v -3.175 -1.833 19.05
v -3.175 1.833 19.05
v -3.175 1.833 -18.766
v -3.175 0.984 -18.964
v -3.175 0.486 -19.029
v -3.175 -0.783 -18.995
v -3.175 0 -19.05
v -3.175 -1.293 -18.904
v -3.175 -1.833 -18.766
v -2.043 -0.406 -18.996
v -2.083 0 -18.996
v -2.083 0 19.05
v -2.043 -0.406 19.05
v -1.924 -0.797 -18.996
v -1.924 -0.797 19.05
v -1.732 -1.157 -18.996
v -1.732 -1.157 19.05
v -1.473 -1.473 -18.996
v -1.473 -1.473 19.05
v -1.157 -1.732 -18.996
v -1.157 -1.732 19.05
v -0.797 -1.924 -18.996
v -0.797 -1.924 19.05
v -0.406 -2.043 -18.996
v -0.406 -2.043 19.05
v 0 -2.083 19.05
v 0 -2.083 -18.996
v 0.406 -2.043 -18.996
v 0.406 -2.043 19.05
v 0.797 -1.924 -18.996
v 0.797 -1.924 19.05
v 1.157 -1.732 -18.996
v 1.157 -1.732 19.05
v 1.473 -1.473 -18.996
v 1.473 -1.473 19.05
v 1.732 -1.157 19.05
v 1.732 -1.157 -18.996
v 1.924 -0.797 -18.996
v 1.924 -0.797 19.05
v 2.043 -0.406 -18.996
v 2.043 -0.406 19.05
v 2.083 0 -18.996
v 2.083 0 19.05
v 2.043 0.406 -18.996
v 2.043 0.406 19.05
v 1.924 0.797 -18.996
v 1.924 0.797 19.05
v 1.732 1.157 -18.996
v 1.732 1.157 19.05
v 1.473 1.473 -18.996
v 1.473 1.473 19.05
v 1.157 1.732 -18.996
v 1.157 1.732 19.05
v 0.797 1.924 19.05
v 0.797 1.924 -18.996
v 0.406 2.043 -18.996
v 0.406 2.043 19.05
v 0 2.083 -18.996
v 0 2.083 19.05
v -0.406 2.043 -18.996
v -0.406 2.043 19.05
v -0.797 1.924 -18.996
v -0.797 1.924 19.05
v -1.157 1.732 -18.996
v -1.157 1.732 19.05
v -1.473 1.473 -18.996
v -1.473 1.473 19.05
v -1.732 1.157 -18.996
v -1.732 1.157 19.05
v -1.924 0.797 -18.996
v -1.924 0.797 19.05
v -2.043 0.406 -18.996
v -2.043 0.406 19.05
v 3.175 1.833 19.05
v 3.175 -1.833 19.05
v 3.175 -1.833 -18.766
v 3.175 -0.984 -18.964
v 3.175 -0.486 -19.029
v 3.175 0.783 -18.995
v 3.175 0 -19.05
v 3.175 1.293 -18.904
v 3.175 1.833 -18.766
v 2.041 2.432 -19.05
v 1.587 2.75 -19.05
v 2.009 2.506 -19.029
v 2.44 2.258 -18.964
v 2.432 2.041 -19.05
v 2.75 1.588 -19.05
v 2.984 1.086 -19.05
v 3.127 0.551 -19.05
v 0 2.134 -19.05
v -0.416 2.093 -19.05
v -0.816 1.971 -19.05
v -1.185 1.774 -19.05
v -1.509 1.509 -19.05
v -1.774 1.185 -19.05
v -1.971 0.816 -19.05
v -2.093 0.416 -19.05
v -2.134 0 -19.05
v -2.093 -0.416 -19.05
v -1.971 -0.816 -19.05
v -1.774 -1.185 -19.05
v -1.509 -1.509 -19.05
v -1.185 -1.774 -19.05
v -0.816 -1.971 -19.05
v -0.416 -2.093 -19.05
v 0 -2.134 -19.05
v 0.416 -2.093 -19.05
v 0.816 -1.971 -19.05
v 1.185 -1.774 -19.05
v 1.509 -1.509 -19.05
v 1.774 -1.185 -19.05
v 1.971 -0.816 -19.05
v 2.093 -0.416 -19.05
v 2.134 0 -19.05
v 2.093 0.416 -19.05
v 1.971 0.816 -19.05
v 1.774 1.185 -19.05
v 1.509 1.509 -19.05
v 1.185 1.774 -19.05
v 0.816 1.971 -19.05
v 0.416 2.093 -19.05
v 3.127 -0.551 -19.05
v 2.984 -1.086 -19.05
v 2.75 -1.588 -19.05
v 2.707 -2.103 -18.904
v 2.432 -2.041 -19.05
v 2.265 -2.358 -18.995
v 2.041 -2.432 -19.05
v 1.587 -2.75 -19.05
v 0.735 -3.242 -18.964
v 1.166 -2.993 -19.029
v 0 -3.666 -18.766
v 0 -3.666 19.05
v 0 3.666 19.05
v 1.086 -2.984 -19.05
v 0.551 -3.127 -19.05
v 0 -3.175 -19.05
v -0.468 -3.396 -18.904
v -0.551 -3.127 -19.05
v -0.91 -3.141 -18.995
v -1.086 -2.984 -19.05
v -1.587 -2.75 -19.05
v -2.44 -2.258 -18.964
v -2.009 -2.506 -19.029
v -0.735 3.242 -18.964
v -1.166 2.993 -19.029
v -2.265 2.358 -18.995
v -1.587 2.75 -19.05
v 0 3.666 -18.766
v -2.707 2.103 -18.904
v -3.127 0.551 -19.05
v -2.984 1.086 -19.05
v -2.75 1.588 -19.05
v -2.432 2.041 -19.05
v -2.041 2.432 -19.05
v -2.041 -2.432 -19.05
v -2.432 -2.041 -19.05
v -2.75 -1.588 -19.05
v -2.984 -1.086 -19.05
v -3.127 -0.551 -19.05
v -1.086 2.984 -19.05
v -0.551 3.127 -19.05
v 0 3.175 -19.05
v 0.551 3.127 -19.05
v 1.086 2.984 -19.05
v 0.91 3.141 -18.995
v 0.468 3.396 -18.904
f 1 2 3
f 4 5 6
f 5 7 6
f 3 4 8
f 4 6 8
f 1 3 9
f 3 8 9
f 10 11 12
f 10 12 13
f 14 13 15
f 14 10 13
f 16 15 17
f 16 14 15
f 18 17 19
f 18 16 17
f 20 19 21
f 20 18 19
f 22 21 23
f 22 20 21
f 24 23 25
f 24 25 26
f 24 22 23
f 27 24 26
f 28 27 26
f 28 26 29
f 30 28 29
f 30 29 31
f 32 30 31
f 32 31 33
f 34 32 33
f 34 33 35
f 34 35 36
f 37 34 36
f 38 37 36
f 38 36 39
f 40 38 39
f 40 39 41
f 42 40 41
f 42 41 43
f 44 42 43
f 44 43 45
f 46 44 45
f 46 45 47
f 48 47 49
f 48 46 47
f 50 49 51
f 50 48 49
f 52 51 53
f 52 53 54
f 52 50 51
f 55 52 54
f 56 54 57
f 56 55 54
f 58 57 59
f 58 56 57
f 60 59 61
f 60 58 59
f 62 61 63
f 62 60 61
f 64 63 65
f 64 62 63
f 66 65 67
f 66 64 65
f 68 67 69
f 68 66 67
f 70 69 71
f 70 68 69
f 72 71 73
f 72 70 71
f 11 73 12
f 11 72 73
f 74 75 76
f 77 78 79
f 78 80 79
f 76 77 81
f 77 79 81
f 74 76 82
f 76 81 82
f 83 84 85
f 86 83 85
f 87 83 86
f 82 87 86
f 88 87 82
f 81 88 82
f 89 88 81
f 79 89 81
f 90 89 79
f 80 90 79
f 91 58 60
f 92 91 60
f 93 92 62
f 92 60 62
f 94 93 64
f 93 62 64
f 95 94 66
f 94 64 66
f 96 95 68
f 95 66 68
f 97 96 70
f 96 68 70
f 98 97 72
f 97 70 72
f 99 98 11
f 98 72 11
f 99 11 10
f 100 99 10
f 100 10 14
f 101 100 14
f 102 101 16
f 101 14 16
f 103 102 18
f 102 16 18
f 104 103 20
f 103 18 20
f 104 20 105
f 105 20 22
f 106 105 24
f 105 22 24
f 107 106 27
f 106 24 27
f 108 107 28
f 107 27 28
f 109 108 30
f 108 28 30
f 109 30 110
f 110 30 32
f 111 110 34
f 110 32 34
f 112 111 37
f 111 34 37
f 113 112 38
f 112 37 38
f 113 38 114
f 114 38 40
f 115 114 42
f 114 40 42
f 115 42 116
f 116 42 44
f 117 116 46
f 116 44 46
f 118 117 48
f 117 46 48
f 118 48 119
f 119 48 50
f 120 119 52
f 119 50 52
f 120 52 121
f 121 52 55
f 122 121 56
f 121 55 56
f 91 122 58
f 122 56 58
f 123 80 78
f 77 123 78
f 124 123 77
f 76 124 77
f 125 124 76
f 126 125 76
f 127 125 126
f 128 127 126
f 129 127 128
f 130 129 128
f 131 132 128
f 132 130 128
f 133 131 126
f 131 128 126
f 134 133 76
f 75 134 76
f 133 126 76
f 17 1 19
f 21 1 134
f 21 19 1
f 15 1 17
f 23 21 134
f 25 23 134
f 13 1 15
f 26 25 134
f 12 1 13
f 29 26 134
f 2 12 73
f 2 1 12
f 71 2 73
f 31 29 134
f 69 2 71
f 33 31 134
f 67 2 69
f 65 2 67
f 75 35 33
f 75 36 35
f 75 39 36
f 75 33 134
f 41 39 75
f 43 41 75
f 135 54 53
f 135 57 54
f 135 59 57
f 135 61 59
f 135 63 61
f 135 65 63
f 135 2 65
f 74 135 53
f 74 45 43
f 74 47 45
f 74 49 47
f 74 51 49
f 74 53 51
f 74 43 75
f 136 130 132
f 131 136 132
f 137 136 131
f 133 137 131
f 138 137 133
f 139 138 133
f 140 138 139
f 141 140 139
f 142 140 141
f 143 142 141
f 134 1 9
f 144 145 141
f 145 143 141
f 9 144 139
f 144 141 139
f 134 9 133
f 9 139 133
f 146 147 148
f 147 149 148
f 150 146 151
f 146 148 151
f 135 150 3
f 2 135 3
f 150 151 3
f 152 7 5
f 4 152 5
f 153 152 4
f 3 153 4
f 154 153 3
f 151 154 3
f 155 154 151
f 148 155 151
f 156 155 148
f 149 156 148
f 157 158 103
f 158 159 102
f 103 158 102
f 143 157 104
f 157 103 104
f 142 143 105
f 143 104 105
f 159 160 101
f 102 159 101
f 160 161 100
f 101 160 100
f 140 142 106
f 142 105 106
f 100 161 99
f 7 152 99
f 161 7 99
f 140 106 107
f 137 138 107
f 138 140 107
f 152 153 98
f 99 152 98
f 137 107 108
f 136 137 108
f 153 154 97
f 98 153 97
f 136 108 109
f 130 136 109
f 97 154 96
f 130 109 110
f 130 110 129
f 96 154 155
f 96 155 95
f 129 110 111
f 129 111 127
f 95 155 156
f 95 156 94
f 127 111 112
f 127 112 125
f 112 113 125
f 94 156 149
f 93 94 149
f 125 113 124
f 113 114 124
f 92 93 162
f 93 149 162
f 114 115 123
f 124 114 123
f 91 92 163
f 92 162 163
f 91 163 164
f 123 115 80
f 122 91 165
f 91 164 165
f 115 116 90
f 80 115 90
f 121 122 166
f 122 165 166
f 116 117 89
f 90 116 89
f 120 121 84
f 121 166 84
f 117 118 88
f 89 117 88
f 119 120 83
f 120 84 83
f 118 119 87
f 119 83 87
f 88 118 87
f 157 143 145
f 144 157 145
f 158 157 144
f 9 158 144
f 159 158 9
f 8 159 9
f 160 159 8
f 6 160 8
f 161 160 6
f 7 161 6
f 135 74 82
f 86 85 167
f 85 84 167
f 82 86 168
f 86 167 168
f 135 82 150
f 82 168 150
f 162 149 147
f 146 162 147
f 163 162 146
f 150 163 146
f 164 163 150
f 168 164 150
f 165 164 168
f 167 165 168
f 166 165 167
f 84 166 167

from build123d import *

# Parameters (mm, degrees)
EXTRUDE1_DEPTH      = 19.05
EXTRUDE1_DEPTH_BACK = 19.05
SKETCH1_R           = 2.0828
SKETCH8_OUTSIDE_W   = 152.724
SKETCH8_OUTSIDE_H   = 153.706
SKETCH8_OUTSIDE_R   = 3.175
EXTRUDE4_DEPTH      = 39.407440143
EXTRUDE4_DRAFT      = -60


with BuildPart() as part:
    # Sketch1 → Extrude1 (new, two sides: drawn at the far end of the back side and taken through both)
    with BuildSketch(Plane.XY.offset(-EXTRUDE1_DEPTH_BACK)):
        Polygon((0, 3.666174209), (-3.175, 1.833087105), (-3.175, -1.833087105), (0, -3.666174209), (3.175, -1.833087105), (3.175, 1.833087105), align=None)
        with Locations(Location((0, 0, 0), (0, 0, 180))):
            Circle(SKETCH1_R, mode=Mode.SUBTRACT)
    extrude(amount=EXTRUDE1_DEPTH + EXTRUDE1_DEPTH_BACK)

    # Extrude3 cone 1 section (through the dimple's axis) → Extrude3 (revolve, cut)
    with BuildSketch(Plane(origin=(0, 0, -19.05), x_dir=(0, 1, 0), z_dir=(1, 0, 0))):
        Polygon((0, 0), (2.1336, 0), (0, 2.28800588), align=None)
    revolve(axis=Axis((0, 0, -19.05), (0, 0, 1)), mode=Mode.SUBTRACT)


with BuildPart() as extrude4_tool:
    # Sketch8 outside → Extrude4 (with draft: the straight prism first)
    with BuildSketch(Plane(origin=(0, 0, -19.05), x_dir=(-1, 0, 0), z_dir=(0, 0, -1))):
        Rectangle(SKETCH8_OUTSIDE_W, SKETCH8_OUTSIDE_H)
        Circle(SKETCH8_OUTSIDE_R, mode=Mode.SUBTRACT)
    extrude(amount=-EXTRUDE4_DEPTH)
    # Extrude4: the draft: its side faces are tilted about the plane it starts from
    extrude4_sides = [extrude4_tool.faces().sort_by_distance(p)[0] for p in [
        (0, -76.853, 0.653720071),
        (-76.362, 0, 0.653720071),
        (0, 76.853, 0.653720071),
        (76.362, 0, 0.653720071),
        (3.175, 0, 0.653720071),
    ]]
    draft(extrude4_sides, Plane(origin=(0, 0, -19.05), x_dir=(-1, 0, 0), z_dir=(0, 0, -1)), EXTRUDE4_DRAFT)


with BuildPart() as part_1:
    add(part.part)

    # Extrude4: cut by extrude4_tool
    add(extrude4_tool.part, mode=Mode.SUBTRACT)


solid = part_1.part
